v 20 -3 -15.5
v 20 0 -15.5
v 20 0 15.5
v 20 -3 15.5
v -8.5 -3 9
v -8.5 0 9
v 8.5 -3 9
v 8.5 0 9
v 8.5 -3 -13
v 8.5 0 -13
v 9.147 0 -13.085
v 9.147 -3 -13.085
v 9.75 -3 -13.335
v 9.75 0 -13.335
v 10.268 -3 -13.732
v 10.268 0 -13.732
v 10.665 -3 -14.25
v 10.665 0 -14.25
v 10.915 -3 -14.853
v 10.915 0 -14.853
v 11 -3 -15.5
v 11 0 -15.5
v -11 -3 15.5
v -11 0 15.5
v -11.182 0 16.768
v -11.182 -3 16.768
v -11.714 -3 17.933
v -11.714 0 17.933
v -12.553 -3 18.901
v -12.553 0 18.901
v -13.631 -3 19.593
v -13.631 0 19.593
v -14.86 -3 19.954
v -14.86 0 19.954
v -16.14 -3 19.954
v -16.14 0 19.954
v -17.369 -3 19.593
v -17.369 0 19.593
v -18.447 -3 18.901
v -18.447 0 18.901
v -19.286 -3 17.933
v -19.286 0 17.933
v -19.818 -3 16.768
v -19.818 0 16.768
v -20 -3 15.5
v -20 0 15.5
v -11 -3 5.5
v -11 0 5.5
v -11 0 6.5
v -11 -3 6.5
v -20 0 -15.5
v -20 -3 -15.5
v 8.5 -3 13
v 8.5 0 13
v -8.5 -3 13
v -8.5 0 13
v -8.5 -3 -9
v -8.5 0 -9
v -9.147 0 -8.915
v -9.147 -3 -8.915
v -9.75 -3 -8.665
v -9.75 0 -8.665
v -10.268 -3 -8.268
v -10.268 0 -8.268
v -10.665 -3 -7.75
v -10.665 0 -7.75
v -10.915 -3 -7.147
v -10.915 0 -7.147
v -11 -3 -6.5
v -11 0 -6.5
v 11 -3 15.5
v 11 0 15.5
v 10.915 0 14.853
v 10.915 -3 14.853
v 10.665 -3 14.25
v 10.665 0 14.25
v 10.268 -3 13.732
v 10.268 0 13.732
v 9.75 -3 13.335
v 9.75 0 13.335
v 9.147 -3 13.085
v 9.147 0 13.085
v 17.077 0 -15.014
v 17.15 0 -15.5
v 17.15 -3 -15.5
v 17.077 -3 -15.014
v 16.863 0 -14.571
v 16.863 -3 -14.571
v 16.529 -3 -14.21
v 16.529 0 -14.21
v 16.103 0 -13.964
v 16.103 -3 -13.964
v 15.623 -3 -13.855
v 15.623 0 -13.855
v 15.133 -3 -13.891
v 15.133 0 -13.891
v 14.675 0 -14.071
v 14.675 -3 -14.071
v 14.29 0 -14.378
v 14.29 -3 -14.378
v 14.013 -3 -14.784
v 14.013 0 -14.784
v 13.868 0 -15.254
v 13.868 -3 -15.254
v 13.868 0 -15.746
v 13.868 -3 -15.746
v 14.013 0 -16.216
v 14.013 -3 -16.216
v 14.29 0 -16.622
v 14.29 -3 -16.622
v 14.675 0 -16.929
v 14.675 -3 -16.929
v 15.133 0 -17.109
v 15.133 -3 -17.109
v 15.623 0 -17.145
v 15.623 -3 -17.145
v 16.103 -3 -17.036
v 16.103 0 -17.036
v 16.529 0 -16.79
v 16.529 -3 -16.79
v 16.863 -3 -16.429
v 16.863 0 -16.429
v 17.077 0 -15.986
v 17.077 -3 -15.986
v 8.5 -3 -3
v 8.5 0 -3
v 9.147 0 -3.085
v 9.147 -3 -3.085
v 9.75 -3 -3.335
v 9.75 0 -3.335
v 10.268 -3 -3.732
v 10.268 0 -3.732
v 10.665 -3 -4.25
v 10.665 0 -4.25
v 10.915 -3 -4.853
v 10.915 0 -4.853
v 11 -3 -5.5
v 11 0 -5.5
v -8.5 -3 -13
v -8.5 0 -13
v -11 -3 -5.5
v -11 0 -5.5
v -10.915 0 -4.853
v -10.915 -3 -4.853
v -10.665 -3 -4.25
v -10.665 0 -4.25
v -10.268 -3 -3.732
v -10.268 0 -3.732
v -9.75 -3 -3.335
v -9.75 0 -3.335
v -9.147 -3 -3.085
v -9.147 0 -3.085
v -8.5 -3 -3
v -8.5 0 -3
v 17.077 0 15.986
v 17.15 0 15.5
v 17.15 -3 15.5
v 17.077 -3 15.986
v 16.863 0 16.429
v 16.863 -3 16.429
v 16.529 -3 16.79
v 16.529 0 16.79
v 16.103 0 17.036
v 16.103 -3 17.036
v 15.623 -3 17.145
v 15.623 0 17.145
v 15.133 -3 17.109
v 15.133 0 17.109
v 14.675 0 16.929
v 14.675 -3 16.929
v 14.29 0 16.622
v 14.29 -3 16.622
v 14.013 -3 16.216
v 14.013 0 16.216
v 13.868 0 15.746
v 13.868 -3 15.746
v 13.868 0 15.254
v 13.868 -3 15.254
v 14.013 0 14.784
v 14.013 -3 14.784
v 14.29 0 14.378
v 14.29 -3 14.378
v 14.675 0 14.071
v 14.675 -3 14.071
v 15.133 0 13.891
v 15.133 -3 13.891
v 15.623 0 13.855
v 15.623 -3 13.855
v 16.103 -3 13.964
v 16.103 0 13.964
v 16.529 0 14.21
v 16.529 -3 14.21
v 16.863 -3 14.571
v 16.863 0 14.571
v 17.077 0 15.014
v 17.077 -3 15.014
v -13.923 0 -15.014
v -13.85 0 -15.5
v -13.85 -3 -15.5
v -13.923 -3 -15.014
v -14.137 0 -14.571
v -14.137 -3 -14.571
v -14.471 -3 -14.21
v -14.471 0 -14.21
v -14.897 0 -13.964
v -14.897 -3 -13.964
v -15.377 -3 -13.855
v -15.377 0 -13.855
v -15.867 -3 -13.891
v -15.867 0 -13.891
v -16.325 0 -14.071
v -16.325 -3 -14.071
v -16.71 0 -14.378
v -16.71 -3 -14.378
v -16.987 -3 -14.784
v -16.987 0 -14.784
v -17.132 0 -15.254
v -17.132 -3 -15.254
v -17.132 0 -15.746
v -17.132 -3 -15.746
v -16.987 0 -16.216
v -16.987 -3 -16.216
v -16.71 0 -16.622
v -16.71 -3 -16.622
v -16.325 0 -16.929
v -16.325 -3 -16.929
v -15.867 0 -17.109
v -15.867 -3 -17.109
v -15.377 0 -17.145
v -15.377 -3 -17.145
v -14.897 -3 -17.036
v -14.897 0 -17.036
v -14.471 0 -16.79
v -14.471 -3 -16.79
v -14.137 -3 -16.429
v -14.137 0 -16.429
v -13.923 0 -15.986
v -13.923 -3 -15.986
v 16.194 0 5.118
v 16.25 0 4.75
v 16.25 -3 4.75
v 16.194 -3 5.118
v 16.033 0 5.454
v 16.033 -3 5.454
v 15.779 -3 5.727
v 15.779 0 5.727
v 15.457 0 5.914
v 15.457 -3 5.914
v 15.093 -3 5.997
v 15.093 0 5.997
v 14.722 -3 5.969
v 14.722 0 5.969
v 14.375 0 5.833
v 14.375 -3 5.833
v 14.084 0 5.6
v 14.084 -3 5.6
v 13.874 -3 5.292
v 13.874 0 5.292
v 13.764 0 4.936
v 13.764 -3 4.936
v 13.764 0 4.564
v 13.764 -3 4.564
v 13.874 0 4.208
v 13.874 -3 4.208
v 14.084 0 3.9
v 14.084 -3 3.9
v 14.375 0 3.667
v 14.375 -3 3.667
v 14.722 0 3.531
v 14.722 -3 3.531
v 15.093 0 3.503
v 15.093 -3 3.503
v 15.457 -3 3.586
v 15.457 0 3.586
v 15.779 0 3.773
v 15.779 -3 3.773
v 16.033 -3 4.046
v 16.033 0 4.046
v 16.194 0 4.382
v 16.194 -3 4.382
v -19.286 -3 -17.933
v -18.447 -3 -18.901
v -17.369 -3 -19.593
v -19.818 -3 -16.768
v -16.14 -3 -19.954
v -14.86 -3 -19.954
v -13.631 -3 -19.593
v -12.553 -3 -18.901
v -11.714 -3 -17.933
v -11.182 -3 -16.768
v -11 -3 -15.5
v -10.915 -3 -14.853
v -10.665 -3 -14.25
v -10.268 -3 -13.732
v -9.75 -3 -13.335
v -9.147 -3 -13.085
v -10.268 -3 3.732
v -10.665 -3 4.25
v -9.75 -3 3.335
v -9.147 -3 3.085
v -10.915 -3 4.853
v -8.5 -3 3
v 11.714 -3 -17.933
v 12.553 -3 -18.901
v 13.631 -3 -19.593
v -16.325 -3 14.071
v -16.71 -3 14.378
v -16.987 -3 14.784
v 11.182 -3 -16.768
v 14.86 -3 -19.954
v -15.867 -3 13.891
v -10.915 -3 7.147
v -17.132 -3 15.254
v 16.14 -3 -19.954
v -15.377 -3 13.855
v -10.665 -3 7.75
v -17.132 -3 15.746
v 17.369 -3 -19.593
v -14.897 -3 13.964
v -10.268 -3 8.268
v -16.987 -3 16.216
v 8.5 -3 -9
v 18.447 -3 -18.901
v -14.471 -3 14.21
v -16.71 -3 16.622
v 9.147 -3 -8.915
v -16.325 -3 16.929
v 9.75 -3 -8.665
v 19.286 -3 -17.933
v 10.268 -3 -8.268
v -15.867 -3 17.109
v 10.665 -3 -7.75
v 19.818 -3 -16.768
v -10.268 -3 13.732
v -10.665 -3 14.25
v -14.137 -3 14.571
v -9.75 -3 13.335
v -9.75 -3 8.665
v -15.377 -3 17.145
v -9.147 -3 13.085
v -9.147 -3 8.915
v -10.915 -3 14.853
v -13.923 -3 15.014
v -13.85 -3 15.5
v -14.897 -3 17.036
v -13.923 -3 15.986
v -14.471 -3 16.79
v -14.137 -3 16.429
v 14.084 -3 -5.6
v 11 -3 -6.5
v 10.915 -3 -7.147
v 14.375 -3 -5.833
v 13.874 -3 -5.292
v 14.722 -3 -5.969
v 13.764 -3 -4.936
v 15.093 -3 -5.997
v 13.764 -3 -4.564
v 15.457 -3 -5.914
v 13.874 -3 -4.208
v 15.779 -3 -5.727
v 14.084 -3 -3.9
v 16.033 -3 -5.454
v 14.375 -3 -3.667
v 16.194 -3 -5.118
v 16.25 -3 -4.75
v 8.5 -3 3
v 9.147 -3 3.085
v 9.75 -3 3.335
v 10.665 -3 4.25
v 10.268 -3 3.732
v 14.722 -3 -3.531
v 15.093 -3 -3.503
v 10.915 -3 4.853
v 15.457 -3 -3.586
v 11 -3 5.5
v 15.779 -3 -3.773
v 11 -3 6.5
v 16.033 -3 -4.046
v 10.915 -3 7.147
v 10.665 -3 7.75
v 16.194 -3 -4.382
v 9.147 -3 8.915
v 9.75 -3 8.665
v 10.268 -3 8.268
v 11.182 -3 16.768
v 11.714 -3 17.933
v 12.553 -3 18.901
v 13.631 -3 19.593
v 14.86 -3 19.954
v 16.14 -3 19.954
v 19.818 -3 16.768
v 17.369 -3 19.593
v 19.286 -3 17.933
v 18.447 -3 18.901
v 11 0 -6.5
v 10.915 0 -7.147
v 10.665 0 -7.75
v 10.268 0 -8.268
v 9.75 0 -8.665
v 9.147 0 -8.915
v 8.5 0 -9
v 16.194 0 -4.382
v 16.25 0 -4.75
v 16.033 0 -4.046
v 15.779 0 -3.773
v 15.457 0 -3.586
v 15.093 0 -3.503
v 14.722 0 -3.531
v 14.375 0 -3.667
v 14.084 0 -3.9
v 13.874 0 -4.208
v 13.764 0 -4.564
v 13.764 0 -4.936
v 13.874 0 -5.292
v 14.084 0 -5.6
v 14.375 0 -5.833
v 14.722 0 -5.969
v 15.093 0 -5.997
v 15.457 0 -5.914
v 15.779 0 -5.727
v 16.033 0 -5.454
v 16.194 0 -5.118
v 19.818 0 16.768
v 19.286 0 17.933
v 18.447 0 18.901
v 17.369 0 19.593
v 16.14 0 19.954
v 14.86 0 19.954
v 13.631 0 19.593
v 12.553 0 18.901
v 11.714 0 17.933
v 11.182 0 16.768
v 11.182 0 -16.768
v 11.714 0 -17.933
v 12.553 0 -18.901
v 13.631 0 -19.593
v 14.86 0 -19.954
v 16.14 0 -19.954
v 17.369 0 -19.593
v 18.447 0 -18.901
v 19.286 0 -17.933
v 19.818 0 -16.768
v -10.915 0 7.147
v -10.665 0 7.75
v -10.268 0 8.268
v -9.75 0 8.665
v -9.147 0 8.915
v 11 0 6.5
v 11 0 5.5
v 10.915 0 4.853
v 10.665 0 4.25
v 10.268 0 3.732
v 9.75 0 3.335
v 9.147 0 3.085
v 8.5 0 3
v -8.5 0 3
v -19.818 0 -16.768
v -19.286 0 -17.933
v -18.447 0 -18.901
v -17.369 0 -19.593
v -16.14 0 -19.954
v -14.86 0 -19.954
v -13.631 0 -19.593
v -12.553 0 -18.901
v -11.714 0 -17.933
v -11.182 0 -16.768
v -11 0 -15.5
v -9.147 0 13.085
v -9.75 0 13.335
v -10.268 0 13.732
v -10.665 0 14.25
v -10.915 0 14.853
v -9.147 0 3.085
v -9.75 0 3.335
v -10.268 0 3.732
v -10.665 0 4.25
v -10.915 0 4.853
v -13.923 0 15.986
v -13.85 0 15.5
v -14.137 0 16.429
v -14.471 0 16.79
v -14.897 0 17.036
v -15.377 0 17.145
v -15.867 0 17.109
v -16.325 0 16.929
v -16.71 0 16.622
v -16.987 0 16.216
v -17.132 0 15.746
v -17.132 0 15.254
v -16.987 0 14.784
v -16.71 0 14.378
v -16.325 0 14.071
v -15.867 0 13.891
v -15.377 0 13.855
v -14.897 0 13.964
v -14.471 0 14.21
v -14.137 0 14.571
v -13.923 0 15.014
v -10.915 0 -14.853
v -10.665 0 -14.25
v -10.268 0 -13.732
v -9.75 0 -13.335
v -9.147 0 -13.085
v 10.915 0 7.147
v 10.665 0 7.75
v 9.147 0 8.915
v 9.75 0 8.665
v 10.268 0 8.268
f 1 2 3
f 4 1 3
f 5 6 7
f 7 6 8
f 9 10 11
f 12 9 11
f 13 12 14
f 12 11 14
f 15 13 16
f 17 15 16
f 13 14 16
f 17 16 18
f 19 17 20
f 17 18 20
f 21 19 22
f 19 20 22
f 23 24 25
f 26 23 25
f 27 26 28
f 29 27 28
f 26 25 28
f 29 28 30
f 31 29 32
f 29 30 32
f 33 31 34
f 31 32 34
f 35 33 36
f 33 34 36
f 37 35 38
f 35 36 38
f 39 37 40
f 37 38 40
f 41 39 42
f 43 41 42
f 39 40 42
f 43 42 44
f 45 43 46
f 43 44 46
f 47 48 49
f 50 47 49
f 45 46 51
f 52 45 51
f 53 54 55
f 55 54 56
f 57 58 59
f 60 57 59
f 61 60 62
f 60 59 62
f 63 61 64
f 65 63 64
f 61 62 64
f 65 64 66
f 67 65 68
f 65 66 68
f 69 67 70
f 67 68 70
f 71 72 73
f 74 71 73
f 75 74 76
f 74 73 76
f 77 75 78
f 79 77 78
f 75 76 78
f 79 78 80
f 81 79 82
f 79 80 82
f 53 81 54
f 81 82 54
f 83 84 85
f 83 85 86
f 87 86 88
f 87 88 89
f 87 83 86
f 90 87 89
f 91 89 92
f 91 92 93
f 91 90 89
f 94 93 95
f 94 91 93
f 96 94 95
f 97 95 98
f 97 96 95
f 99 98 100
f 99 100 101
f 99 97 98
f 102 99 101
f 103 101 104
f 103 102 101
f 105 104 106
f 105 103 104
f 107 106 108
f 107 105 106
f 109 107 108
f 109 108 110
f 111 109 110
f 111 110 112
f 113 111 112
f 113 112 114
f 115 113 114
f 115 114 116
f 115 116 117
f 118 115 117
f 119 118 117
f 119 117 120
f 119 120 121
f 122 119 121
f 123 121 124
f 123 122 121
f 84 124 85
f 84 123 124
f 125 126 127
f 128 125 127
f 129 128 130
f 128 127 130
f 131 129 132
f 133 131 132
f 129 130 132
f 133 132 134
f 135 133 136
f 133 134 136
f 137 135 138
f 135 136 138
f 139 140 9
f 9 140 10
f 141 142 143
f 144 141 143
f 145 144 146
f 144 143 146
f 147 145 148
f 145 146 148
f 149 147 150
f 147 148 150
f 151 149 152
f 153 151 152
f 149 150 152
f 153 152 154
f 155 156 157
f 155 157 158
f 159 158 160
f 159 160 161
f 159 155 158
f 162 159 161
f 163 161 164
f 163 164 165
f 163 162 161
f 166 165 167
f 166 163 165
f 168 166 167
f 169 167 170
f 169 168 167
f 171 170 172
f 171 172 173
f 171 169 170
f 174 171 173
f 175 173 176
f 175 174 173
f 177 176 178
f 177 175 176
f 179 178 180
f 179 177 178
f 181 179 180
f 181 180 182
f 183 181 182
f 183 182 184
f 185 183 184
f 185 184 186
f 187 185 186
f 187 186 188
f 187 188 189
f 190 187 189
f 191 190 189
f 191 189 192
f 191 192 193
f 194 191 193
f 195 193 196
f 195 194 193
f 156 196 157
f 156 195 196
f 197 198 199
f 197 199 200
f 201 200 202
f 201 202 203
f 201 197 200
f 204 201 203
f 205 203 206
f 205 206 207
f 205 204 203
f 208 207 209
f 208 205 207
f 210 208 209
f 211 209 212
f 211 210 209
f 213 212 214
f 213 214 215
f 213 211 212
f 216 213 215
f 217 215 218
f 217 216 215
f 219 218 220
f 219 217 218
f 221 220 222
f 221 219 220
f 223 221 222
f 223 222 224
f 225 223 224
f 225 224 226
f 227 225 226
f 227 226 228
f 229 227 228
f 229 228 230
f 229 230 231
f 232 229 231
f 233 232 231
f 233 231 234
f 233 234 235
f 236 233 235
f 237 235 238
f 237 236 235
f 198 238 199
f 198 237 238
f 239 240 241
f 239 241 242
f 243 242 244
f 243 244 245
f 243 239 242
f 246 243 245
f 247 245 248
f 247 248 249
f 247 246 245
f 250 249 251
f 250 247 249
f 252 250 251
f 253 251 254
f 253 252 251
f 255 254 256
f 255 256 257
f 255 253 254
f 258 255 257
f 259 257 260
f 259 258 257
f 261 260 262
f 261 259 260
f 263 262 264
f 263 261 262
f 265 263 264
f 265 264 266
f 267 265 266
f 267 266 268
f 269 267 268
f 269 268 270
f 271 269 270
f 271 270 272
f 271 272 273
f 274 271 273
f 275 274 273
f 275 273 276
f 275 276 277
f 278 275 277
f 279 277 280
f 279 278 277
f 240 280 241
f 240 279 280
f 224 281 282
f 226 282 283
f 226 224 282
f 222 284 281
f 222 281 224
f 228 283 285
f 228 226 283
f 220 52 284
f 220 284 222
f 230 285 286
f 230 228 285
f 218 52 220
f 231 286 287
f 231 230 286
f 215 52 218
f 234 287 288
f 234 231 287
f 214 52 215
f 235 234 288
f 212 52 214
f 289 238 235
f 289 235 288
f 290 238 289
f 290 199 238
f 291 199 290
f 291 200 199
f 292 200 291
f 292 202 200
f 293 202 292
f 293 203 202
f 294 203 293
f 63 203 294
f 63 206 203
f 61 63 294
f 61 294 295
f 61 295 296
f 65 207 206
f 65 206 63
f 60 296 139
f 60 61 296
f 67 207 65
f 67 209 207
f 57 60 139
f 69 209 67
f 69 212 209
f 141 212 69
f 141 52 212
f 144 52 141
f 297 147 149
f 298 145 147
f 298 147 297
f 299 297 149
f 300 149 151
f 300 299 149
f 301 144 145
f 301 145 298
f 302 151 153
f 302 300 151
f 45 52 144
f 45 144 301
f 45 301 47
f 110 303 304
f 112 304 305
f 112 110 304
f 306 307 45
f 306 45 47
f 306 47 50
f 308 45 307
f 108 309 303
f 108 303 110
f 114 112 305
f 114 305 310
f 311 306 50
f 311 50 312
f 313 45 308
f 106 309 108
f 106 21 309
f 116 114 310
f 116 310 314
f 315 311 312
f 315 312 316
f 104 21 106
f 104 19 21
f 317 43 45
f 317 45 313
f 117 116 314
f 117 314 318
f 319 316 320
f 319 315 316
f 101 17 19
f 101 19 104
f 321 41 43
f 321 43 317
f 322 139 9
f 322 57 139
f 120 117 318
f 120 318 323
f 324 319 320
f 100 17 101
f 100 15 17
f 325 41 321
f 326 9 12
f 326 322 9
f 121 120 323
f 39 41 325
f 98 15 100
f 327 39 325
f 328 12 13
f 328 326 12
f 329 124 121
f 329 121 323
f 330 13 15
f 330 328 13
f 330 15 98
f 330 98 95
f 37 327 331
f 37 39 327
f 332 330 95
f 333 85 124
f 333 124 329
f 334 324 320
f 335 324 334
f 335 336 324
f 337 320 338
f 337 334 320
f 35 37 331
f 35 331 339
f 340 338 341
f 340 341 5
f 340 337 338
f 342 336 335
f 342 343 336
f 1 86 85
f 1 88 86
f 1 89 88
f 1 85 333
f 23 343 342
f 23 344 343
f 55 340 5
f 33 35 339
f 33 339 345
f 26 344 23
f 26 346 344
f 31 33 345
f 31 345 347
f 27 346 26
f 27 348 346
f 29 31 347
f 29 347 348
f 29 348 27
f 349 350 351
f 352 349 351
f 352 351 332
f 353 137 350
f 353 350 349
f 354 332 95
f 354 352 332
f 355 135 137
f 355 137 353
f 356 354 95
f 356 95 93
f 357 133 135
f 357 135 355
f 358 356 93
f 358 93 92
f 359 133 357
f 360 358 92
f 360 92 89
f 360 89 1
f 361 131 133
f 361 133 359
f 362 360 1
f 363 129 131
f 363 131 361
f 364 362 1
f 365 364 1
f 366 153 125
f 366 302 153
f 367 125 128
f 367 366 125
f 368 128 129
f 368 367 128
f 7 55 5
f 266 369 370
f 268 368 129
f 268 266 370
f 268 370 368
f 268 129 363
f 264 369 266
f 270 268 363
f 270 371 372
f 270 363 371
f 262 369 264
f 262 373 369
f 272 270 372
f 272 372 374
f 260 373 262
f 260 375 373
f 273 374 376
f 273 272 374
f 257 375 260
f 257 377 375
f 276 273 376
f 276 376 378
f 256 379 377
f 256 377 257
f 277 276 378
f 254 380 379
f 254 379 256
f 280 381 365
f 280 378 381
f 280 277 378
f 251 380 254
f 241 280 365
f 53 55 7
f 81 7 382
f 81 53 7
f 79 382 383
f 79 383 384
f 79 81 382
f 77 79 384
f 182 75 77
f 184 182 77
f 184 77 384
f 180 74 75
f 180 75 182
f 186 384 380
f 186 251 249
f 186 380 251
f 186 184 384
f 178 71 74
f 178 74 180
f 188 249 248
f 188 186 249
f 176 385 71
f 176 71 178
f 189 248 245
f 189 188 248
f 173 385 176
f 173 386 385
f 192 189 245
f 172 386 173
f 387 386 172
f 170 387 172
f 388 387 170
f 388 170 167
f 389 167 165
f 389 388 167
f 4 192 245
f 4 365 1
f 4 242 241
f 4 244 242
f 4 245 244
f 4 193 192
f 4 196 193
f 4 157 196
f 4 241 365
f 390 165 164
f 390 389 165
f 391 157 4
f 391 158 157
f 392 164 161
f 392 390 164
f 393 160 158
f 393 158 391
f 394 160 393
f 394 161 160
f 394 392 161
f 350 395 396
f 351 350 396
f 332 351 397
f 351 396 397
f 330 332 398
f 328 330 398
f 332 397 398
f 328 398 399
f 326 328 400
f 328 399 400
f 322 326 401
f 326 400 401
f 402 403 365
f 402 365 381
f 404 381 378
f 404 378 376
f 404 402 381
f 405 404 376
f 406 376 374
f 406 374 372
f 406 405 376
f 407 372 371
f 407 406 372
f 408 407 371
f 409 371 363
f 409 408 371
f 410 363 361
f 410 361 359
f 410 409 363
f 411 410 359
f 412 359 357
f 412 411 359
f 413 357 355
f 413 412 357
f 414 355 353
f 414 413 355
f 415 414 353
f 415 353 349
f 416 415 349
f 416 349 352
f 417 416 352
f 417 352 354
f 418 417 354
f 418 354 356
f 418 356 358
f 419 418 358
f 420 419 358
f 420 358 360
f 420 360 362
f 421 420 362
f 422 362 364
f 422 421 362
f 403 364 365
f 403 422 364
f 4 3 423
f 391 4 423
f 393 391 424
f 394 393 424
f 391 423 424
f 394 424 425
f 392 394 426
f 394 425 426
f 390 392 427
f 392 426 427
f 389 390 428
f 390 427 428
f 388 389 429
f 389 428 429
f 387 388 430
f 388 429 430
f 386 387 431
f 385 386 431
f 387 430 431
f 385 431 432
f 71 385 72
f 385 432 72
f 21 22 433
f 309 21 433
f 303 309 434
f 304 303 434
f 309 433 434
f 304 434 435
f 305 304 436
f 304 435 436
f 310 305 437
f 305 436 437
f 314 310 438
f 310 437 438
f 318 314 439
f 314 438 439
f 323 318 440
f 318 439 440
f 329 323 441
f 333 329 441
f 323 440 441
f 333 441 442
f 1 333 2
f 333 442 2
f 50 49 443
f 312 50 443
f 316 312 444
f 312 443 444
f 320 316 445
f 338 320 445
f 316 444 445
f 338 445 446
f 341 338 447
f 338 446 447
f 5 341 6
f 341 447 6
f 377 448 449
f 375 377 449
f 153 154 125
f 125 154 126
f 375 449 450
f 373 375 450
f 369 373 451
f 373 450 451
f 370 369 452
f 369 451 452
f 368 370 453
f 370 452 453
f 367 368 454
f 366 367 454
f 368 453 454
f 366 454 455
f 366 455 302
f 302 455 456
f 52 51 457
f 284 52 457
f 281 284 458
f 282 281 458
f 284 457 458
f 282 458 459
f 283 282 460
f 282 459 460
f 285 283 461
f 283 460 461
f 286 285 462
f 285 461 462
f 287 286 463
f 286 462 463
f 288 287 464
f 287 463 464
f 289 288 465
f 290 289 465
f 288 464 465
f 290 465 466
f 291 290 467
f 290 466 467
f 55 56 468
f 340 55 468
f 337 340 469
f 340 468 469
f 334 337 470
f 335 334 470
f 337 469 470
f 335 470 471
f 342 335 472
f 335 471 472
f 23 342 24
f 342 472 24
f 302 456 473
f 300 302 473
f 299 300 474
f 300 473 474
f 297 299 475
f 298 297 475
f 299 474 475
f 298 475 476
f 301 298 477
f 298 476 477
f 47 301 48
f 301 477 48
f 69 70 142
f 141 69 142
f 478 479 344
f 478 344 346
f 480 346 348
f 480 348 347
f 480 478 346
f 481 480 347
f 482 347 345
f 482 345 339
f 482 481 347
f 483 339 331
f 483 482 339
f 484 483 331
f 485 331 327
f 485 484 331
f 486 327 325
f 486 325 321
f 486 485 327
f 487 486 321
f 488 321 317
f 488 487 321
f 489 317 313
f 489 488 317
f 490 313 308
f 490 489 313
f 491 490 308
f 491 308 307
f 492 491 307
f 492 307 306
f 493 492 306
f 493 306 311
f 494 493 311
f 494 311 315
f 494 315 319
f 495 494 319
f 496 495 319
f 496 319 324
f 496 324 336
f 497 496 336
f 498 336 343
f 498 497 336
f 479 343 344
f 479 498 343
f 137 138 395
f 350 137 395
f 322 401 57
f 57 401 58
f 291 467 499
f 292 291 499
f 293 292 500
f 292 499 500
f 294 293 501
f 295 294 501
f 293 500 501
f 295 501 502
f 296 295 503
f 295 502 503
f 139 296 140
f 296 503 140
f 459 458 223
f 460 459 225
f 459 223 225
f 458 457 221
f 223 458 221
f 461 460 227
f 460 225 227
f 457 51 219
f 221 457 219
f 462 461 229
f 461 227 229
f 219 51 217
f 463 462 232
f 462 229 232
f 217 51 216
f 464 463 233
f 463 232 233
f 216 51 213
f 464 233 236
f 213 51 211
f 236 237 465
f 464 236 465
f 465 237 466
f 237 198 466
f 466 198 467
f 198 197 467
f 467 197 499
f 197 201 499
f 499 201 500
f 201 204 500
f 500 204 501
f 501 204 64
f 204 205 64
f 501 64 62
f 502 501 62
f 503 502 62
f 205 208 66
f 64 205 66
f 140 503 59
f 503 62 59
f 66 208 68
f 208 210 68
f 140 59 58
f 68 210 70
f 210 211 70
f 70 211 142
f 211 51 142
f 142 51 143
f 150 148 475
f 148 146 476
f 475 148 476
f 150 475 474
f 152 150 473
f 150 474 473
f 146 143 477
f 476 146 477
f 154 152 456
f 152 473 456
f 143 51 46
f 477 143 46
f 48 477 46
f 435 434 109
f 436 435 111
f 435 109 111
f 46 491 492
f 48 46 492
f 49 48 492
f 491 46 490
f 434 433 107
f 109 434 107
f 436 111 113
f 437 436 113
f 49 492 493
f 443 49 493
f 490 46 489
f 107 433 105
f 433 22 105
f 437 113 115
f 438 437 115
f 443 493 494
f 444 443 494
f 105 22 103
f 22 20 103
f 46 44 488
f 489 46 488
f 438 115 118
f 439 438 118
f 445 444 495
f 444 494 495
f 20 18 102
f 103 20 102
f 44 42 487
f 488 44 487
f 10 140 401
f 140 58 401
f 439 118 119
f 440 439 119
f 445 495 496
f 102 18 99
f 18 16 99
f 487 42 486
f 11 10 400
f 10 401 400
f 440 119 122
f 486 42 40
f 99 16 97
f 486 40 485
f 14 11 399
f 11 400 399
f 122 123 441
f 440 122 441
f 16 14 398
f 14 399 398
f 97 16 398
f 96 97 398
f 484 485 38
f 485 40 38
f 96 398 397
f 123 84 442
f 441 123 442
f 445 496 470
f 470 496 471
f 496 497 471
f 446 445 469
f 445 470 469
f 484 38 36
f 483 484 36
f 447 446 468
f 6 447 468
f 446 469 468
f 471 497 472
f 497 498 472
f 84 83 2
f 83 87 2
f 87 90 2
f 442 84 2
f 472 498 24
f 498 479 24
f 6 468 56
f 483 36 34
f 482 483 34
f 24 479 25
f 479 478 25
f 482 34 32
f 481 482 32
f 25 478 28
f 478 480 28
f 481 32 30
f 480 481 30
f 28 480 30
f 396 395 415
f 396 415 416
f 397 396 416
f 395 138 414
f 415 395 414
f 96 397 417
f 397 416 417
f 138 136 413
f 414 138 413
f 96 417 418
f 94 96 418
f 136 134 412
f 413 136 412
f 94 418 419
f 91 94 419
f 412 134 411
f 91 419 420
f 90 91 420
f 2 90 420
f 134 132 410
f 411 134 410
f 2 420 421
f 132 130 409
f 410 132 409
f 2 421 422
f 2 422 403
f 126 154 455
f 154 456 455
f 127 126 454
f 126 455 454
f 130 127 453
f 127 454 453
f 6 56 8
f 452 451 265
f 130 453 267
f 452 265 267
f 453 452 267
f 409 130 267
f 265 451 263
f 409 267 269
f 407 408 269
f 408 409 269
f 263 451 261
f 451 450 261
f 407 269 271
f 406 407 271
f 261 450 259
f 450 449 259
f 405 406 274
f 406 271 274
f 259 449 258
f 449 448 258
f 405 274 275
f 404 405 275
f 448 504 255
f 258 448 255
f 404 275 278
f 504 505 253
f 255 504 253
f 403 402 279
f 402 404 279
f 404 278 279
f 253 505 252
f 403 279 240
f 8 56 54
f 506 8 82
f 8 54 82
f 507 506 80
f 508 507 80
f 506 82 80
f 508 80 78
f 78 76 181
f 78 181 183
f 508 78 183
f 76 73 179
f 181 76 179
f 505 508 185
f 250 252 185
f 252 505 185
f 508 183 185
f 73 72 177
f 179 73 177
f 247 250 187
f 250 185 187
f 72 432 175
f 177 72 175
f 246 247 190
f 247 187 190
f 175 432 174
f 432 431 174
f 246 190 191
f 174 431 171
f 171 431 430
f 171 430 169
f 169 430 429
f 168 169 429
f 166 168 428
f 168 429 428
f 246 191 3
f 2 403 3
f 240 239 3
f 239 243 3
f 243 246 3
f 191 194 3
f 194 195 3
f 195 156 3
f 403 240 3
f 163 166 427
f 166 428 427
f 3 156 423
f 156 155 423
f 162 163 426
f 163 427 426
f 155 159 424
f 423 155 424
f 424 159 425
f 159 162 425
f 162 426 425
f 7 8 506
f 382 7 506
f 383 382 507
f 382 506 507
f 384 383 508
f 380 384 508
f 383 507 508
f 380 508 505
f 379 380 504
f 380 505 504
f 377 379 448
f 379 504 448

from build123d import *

# Parameters (mm, degrees)
F0_R     = 1.65
F0_R_2   = 1.25
F1_DEPTH = 3


with BuildPart() as f1:
    # F0 (on Front) → F1 (new body)
    with BuildSketch(Plane.XZ):
        with BuildLine():
            ThreePointArc((-8.5, 13), (-10.267767, 13.732233), (-11, 15.5))
            ThreePointArc((-11, 15.5), (-15.5, 20), (-20, 15.5))
            Line((-20, 15.5), (-20, -15.5))
            ThreePointArc((-20, -15.5), (-15.5, -20), (-11, -15.5))
            ThreePointArc((-11, -15.5), (-10.267767, -13.732233), (-8.5, -13))
            Line((-8.5, -13), (8.5, -13))
            ThreePointArc((8.5, -13), (10.267767, -13.732233), (11, -15.5))
            ThreePointArc((11, -15.5), (15.5, -20), (20, -15.5))
            Line((20, -15.5), (20, 15.5))
            ThreePointArc((20, 15.5), (15.5, 20), (11, 15.5))
            ThreePointArc((11, 15.5), (10.267767, 13.732233), (8.5, 13))
            Line((8.5, 13), (-8.5, 13))
        make_face()
        with Locations((-15.5, -15.5)):
            Circle(F0_R, mode=Mode.SUBTRACT)
        with Locations((15.5, -15.5)):
            Circle(F0_R, mode=Mode.SUBTRACT)
        with BuildLine():
            Line((-8.5, -3), (8.5, -3))
            ThreePointArc((8.5, -3), (10.267767, -3.732233), (11, -5.5))
            Line((11, -5.5), (11, -6.5))
            ThreePointArc((11, -6.5), (10.267767, -8.267767), (8.5, -9))
            Line((8.5, -9), (-8.5, -9))
            ThreePointArc((-8.5, -9), (-10.267767, -8.267767), (-11, -6.5))
            Line((-11, -6.5), (-11, -5.5))
            ThreePointArc((-11, -5.5), (-10.267767, -3.732233), (-8.5, -3))
        make_face(mode=Mode.SUBTRACT)
        with Locations((15, -4.75)):
            Circle(F0_R_2, mode=Mode.SUBTRACT)
        with Locations((-15.5, 15.5)):
            Circle(F0_R, mode=Mode.SUBTRACT)
        with BuildLine():
            ThreePointArc((11, 5.5), (10.267767, 3.732233), (8.5, 3))
            Line((8.5, 3), (-8.5, 3))
            ThreePointArc((-8.5, 3), (-10.267767, 3.732233), (-11, 5.5))
            Line((-11, 5.5), (-11, 6.5))
            ThreePointArc((-11, 6.5), (-10.267767, 8.267767), (-8.5, 9))
            Line((-8.5, 9), (8.5, 9))
            ThreePointArc((8.5, 9), (10.267767, 8.267767), (11, 6.5))
            Line((11, 6.5), (11, 5.5))
        make_face(mode=Mode.SUBTRACT)
        with Locations((15, 4.75)):
            Circle(F0_R_2, mode=Mode.SUBTRACT)
        with Locations((15.5, 15.5)):
            Circle(F0_R, mode=Mode.SUBTRACT)
    extrude(amount=F1_DEPTH)


solid = f1.part
